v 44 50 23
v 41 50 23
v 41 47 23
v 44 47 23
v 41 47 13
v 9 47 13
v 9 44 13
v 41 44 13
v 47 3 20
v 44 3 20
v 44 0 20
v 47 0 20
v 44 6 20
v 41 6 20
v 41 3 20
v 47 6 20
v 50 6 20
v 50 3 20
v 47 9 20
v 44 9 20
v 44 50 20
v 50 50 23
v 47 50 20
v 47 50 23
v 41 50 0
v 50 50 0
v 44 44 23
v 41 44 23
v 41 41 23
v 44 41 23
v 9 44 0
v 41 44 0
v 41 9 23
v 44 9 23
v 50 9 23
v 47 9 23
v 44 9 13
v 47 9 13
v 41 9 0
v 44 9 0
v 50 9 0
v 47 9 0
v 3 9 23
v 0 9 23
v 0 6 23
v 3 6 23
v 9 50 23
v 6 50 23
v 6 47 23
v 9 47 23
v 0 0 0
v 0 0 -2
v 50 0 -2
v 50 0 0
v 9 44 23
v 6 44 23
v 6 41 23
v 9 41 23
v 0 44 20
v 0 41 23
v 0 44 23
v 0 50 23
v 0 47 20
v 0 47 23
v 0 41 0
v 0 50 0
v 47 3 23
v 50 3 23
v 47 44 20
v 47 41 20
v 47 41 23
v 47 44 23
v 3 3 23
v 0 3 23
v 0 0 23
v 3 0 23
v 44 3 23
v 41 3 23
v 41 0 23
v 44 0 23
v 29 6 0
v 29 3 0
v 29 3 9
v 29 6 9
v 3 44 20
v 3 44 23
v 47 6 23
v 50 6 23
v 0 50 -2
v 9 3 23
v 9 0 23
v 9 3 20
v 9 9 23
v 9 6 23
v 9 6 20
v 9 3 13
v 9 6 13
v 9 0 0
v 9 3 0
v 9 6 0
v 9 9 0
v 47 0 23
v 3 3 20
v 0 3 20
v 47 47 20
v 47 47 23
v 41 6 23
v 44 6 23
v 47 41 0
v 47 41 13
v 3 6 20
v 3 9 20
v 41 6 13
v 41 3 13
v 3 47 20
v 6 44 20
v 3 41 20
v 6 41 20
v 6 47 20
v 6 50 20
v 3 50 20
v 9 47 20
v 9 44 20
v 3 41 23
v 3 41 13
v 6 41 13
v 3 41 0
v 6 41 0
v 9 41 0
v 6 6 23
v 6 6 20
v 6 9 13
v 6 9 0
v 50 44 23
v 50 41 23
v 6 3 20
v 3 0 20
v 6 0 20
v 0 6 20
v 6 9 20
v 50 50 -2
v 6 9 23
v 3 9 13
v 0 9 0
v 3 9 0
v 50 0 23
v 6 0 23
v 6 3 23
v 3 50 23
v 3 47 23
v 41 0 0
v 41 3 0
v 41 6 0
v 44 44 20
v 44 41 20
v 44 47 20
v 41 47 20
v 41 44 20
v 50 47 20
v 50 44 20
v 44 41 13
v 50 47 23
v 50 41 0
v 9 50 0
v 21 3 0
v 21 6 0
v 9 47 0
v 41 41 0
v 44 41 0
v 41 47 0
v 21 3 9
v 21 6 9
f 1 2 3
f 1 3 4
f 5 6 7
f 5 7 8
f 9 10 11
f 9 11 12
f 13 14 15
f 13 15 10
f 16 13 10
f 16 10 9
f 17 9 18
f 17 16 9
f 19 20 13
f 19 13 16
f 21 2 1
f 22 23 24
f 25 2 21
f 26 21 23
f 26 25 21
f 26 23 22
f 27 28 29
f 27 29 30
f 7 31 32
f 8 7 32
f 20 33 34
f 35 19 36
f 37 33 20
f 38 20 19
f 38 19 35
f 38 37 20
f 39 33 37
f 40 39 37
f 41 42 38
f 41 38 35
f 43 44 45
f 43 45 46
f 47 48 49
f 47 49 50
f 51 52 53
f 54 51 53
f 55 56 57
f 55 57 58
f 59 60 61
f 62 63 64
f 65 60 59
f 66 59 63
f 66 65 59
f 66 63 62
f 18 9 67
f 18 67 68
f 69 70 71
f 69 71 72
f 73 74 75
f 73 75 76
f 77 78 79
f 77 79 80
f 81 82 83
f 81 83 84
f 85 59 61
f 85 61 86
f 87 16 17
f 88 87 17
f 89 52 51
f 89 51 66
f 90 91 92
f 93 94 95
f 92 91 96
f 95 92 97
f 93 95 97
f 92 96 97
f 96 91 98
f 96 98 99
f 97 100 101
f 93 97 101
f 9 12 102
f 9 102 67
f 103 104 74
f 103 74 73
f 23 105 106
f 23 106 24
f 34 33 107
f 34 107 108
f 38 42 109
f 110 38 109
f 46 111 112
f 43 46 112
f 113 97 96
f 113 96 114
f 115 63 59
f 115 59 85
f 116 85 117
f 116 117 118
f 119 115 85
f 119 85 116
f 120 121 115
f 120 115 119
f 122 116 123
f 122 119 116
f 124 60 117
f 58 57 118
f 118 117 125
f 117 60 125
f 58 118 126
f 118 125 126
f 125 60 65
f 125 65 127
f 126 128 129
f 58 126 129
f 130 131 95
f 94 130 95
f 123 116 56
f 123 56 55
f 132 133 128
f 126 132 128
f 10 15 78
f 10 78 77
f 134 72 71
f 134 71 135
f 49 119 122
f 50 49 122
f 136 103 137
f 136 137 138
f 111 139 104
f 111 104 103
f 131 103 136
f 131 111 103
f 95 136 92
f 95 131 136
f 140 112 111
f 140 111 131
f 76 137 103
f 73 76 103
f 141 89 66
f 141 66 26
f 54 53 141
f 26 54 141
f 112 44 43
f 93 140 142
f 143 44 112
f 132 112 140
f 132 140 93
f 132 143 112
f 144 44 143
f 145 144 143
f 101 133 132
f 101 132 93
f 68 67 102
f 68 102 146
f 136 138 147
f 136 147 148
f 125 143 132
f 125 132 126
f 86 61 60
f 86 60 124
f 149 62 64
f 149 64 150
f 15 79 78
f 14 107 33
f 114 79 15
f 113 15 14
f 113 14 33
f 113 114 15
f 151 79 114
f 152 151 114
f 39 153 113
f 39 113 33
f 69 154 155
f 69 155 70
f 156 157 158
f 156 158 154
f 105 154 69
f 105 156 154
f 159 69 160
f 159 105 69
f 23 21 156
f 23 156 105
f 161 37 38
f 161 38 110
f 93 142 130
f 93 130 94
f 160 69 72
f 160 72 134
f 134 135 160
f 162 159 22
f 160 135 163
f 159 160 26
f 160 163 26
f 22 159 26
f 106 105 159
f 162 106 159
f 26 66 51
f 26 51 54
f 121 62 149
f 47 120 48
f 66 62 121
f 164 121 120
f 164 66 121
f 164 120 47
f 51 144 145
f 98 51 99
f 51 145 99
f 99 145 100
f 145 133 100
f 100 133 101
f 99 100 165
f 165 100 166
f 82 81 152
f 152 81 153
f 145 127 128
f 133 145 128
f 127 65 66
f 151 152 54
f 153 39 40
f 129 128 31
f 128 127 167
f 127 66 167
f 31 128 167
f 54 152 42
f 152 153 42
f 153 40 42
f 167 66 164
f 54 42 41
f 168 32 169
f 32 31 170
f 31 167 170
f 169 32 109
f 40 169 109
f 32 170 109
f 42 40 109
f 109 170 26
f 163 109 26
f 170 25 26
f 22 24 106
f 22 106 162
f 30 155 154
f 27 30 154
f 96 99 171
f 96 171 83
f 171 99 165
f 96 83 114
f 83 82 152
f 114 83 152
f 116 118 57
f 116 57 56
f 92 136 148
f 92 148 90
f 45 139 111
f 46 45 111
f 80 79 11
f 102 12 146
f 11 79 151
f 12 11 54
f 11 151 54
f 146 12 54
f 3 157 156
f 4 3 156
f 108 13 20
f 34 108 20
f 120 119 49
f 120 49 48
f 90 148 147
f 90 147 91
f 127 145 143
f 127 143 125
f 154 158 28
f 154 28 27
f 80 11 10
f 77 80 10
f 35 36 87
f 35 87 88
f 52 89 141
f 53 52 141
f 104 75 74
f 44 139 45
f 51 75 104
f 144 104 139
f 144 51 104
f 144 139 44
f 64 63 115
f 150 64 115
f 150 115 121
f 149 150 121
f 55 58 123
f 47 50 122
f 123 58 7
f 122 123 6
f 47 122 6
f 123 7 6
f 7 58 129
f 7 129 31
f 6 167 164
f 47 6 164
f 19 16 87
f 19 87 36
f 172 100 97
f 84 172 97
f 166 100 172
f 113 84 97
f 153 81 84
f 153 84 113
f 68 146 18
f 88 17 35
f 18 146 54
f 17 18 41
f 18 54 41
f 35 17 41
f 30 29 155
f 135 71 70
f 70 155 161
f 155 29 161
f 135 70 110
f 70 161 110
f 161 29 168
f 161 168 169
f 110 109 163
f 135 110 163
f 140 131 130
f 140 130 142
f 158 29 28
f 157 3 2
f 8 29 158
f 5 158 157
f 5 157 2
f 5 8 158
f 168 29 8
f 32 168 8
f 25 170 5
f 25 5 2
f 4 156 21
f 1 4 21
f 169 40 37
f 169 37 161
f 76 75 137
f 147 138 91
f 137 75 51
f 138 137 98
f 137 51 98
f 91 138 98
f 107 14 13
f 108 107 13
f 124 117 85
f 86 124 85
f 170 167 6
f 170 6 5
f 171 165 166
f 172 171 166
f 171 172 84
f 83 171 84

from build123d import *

# Parameters (mm, degrees)
BOX_W                  = 50
BOX_H                  = 50
BOX_DEPTH              = 2
BOX010_W               = 8
BOX010_H               = 10
BOX010_DEPTH           = 9
BOX006_W               = 32
BOX006_H               = 3
BOX006_DEPTH           = 13
BOX009_W               = 32
BOX009_H               = 3
BOX009_DEPTH           = 13
BOX009_PLACEMENT_ANGLE = 90
BOX007_W               = 32
BOX007_H               = 3
BOX007_DEPTH           = 13
BOX005_W               = 3
BOX005_H               = 3
BOX005_DEPTH           = 3
BOX004_W               = 3
BOX004_H               = 3
BOX004_DEPTH           = 3
BOX003_W               = 3
BOX003_H               = 3
BOX003_DEPTH           = 3
BOX002_W               = 9
BOX002_H               = 9
BOX002_DEPTH           = 20
BOX001_W               = 3
BOX001_H               = 3
BOX001_DEPTH           = 3
BOX008_W               = 32
BOX008_H               = 3
BOX008_DEPTH           = 13
BOX008_PLACEMENT_ANGLE = 90


with BuildPart() as base:
    # Box → Box (new body)
    with BuildSketch(Plane.XY.offset(-2)):
        with Locations((25, 25)):
            Rectangle(BOX_W, BOX_H)
    extrude(amount=BOX_DEPTH)


with BuildPart() as puerta:
    # Box010 → Box010 (new body)
    with BuildSketch(Plane(origin=(21, 0, 0), x_dir=(1, 0, 0), z_dir=(0, 0, 1))):
        with Locations((4, 5)):
            Rectangle(BOX010_W, BOX010_H)
    extrude(amount=BOX010_DEPTH)


with BuildPart() as muro_puerta:
    # Box006 → Box006 (new body)
    with BuildSketch(Plane(origin=(9, 3, 0), x_dir=(1, 0, 0), z_dir=(0, 0, 1))):
        with Locations((16, 1.5)):
            Rectangle(BOX006_W, BOX006_H)
    extrude(amount=BOX006_DEPTH)

    # Cut: cut puerta
    add(puerta.part, mode=Mode.SUBTRACT)


with BuildPart() as muro003:
    # Box009 → Box009 (new body)
    with BuildSketch(Plane.XY):
        with Locations((16, 1.5)):
            Rectangle(BOX009_W, BOX009_H)
    extrude(amount=BOX009_DEPTH)


with BuildPart() as muro003_1:
    # Box009 placement: moved
    add(muro003.part.moved(Location((47, 9, 0))).rotate(Axis((47, 9, 0), (0, 0, 1)), BOX009_PLACEMENT_ANGLE))


with BuildPart() as muro001:
    # Box007 → Box007 (new body)
    with BuildSketch(Plane(origin=(9, 44, 0), x_dir=(1, 0, 0), z_dir=(0, 0, 1))):
        with Locations((16, 1.5)):
            Rectangle(BOX007_W, BOX007_H)
    extrude(amount=BOX007_DEPTH)


with BuildPart() as almena003:
    # Box005 → Box005 (new body)
    with BuildSketch(Plane(origin=(6, 6, 20), x_dir=(1, 0, 0), z_dir=(0, 0, 1))):
        with Locations((1.5, 1.5)):
            Rectangle(BOX005_W, BOX005_H)
    extrude(amount=BOX005_DEPTH)


with BuildPart() as almena002:
    # Box004 → Box004 (new body)
    with BuildSketch(Plane(origin=(0, 6, 20), x_dir=(1, 0, 0), z_dir=(0, 0, 1))):
        with Locations((1.5, 1.5)):
            Rectangle(BOX004_W, BOX004_H)
    extrude(amount=BOX004_DEPTH)


with BuildPart() as almena001:
    # Box003 → Box003 (new body)
    with BuildSketch(Plane(origin=(6, 0, 20), x_dir=(1, 0, 0), z_dir=(0, 0, 1))):
        with Locations((1.5, 1.5)):
            Rectangle(BOX003_W, BOX003_H)
    extrude(amount=BOX003_DEPTH)


with BuildPart() as base_torre:
    # Box002 → Box002 (new body)
    with BuildSketch(Plane.XY):
        with Locations((4.5, 4.5)):
            Rectangle(BOX002_W, BOX002_H)
    extrude(amount=BOX002_DEPTH)


with BuildPart() as almena:
    # Box001 → Box001 (new body)
    with BuildSketch(Plane.XY.offset(20)):
        with Locations((1.5, 1.5)):
            Rectangle(BOX001_W, BOX001_H)
    extrude(amount=BOX001_DEPTH)


with BuildPart() as fusion002:
    # Fusion002 base: copy of Almena
    add(almena.part)

    # Fusion002: union Almena003, Almena002, Almena001, Base-torre
    add(almena003.part)
    add(almena002.part)
    add(almena001.part)
    add(base_torre.part)


with BuildPart() as fusion002_1:
    # Fusion002 placement: moved
    add(fusion002.part.moved(Location((0, 41, 0))))


with BuildPart() as fusion001:
    # Fusion001 base: copy of Almena
    add(almena.part)

    # Fusion001: union Almena003, Almena002, Almena001, Base-torre
    add(almena003.part)
    add(almena002.part)
    add(almena001.part)
    add(base_torre.part)


with BuildPart() as fusion001_1:
    # Fusion001 placement: moved
    add(fusion001.part.moved(Location((41, 0, 0))))


with BuildPart() as fusion003:
    # Fusion003 base: copy of Almena
    add(almena.part)

    # Fusion003: union Almena003, Almena002, Almena001, Base-torre
    add(almena003.part)
    add(almena002.part)
    add(almena001.part)
    add(base_torre.part)


with BuildPart() as fusion003_1:
    # Fusion003 placement: moved
    add(fusion003.part.moved(Location((41, 41, 0))))


with BuildPart() as muro002:
    # Box008 → Box008 (new body)
    with BuildSketch(Plane.XY):
        with Locations((16, 1.5)):
            Rectangle(BOX008_W, BOX008_H)
    extrude(amount=BOX008_DEPTH)


with BuildPart() as muro002_1:
    # Box008 placement: moved
    add(muro002.part.moved(Location((6, 9, 0))).rotate(Axis((6, 9, 0), (0, 0, 1)), BOX008_PLACEMENT_ANGLE))


with BuildPart() as castillo:
    # Fusion base: copy of Almena
    add(almena.part)

    # Fusion: union Almena003, Almena002, Almena001, Base-torre
    add(almena003.part)
    add(almena002.part)
    add(almena001.part)
    add(base_torre.part)

    # Fusion004: union Muro-puerta, Muro003, Muro001, Fusion002, Fusion001, Fusion003, Muro002
    add(muro_puerta.part)
    add(muro003_1.part)
    add(muro001.part)
    add(fusion002_1.part)
    add(fusion001_1.part)
    add(fusion003_1.part)
    add(muro002_1.part)


solid = Compound([base.part, castillo.part])
